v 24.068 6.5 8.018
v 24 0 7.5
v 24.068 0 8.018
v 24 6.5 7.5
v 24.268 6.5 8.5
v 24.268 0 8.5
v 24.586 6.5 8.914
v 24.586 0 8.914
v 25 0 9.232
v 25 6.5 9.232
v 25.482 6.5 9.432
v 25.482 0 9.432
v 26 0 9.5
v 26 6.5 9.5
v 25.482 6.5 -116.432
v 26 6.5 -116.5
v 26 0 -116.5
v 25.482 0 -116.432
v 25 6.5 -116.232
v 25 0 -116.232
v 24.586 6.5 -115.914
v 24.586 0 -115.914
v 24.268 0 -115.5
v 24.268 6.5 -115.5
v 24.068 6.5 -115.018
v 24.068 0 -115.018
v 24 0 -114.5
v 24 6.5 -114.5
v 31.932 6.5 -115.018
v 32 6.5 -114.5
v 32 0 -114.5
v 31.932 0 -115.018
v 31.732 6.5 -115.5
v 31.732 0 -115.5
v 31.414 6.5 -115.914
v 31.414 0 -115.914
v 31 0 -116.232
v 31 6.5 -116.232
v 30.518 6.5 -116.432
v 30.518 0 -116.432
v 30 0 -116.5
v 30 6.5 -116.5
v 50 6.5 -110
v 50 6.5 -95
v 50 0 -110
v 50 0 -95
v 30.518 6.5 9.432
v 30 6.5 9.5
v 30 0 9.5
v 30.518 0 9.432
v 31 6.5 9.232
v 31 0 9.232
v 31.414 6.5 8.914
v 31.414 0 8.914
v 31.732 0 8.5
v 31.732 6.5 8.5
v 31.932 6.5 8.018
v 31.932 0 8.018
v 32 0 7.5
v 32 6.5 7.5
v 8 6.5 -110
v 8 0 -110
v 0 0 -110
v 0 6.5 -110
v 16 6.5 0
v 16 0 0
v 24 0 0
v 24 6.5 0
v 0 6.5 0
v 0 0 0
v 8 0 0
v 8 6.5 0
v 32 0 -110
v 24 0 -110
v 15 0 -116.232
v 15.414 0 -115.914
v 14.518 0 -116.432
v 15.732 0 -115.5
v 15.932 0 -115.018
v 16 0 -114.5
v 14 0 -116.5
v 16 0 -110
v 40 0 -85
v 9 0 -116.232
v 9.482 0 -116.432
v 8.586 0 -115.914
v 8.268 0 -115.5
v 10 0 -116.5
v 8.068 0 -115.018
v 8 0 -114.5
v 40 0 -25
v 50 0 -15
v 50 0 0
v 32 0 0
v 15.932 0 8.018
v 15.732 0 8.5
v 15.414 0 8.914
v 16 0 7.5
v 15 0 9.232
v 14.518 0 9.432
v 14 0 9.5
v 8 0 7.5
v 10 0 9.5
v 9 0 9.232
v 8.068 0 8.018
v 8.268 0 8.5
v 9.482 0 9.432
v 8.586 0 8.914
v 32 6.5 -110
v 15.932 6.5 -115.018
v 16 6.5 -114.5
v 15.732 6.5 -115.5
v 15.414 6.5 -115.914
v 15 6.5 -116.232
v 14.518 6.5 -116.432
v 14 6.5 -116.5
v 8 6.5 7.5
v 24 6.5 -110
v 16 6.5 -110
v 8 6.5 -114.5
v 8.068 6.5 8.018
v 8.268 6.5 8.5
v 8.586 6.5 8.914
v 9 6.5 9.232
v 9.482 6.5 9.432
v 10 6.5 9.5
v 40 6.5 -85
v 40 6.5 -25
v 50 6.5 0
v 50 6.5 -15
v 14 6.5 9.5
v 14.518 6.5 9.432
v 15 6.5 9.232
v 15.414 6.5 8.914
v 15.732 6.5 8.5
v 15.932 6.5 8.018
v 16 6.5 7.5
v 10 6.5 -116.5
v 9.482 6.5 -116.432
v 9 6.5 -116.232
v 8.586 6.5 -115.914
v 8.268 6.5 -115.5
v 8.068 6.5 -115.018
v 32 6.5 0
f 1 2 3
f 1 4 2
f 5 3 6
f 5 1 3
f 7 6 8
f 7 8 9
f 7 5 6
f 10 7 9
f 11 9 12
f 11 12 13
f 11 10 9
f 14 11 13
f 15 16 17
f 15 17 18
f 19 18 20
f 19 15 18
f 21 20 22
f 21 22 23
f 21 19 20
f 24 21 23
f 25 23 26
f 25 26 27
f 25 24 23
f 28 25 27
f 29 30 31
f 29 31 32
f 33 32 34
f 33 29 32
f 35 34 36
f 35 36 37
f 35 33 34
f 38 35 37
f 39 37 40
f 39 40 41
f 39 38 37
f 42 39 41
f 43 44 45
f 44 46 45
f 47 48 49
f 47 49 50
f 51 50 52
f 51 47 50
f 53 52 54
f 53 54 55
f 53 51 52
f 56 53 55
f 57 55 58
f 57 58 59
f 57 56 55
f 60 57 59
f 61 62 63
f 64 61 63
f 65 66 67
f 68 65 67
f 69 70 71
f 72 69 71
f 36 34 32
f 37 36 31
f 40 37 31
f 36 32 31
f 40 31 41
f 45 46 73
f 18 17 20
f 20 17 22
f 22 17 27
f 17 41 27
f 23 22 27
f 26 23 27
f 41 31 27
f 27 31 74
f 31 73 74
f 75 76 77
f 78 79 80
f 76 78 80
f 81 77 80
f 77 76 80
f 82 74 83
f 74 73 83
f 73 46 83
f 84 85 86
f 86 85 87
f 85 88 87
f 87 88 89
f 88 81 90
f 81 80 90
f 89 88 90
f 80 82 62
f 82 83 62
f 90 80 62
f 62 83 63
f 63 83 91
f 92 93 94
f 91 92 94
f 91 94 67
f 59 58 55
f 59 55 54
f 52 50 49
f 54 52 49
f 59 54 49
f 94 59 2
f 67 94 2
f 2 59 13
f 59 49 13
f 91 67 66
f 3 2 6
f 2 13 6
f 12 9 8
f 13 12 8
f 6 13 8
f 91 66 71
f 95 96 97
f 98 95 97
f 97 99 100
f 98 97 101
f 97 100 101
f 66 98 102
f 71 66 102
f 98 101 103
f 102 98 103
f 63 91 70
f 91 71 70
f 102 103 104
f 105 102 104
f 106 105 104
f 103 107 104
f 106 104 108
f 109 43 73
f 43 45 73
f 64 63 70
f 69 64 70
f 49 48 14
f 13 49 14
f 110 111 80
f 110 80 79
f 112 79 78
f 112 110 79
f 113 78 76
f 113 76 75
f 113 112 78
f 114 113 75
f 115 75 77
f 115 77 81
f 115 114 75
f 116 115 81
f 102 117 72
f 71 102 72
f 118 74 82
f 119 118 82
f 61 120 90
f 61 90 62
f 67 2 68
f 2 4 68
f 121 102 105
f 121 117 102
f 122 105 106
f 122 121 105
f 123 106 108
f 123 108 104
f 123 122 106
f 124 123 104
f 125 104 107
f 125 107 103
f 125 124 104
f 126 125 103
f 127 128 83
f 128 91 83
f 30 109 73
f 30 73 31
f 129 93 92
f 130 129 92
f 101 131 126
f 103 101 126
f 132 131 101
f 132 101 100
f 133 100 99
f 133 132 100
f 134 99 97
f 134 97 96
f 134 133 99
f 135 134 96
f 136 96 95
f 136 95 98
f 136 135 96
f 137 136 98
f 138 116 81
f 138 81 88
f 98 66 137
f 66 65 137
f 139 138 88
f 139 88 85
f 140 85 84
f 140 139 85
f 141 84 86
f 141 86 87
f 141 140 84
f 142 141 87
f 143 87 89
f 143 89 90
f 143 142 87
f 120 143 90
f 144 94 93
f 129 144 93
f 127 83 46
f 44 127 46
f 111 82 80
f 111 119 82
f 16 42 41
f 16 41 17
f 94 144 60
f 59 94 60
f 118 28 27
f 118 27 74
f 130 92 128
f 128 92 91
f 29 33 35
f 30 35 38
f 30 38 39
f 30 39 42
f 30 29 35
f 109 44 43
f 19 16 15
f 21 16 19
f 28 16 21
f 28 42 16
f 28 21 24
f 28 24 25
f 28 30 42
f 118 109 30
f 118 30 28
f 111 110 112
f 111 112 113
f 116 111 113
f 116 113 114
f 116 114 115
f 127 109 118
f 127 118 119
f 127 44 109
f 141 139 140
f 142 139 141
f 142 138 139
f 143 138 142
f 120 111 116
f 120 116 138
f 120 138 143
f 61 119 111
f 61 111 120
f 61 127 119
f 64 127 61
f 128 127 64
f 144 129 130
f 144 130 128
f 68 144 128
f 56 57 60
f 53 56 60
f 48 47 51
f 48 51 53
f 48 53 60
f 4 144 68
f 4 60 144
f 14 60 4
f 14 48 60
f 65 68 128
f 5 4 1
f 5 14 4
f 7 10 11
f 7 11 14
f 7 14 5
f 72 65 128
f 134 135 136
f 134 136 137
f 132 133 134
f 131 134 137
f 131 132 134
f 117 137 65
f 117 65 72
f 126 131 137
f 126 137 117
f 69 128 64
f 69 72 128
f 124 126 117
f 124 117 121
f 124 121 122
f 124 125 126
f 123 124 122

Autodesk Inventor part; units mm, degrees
ref_plane "YZ Plane" through (0, 0, 0) normal (1, 0, 0) x (0, 1, 0)
ref_plane "XZ Plane" through (0, 0, 0) normal (0, 1, 0) x (-1, 0, 0)
ref_plane "XY Plane" through (0, 0, 0) normal (0, 0, 1) x (1, 0, 0)
sketch "Sketch1" plane through (0, 0, 0) normal (0, 1, 0) x (-1, 0, 0)
  line L0 (0, 0) -> (-40, 0)
  line L1 (-40, 0) -> (-40, -110)
  line L2 (-40, -110) -> (0, -110)
  line L3 (0, -110) -> (0, 0)
  dimension "d0" = 110
  dimension "d1" = 40
extrude "Extrusion1" add sketch "Sketch1" along normal blind 6.5
sketch "Sketch2" plane through (0, 6.5, 0) normal (0, 1, 0) x (1, 0, 0)
  line L0 (40, 0) -> (40, 110) projected
  line L1 (40, 110) -> (0, 110) projected
  line L2 (0, 110) -> (0, 0) projected
  line L3 (8, 110) -> (16, 110)
  line L4 (16, 110) -> (16, 114.5)
  line L5 (14, 116.5) -> (10, 116.5)
  line L6 (8, 114.5) -> (8, 110)
  line L7 (24, 110) -> (32, 110)
  line L8 (32, 110) -> (32, 114.5)
  line L9 (30, 116.5) -> (26, 116.5)
  line L10 (24, 114.5) -> (24, 110)
  arc A0 (10, 116.5) -> (8, 114.5) centre (10, 114.5) ccw
  arc A1 (16, 114.5) -> (14, 116.5) centre (14, 114.5) ccw
  arc A2 (26, 116.5) -> (24, 114.5) centre (26, 114.5) ccw
  arc A3 (32, 114.5) -> (30, 116.5) centre (30, 114.5) ccw
  line L11 (8, 112.25) -> (0, 112.25) construction
  line L12 (16, 112.25) -> (24, 112.25) construction
  line L13 (32, 112.25) -> (40, 112.25) construction
  line L14 (0, 55) -> (40, 55) construction
  line L15 (0, 0) -> (40, 0) projected
  line L16 (40, 0) -> (40, 110) projected
  line L17 (40, 110) -> (0, 110) projected
  line L18 (0, 110) -> (0, 0) projected
  line L19 (8, 0) -> (16, 0)
  line L20 (16, 0) -> (16, -7.5)
  line L21 (14, -9.5) -> (10, -9.5)
  line L22 (8, -7.5) -> (8, 0)
  line L23 (24, 0) -> (32, 0)
  line L24 (32, 0) -> (32, -7.5)
  line L25 (30, -9.5) -> (26, -9.5)
  line L26 (24, -7.5) -> (24, 0)
  arc A4 (8, -7.5) -> (10, -9.5) centre (10, -7.5) ccw
  arc A5 (14, -9.5) -> (16, -7.5) centre (14, -7.5) ccw
  arc A6 (24, -7.5) -> (26, -9.5) centre (26, -7.5) ccw
  arc A7 (30, -9.5) -> (32, -7.5) centre (30, -7.5) ccw
  dimension "d4" = 2
  dimension "d5" = 8
  dimension "d6" = 8
  dimension "d7" = 6.5
  dimension "d10" = 2
  dimension "d11" = 9.5
extrude "Extrusion3" add sketch "Sketch2" against normal blind 6.5 contours L24 A7 L25 A6 L26 L15 | L1 L10 A2 L9 A3 L8 | L20 A5 L21 A4 L22 L15 | L1 L6 A0 L5 A1 L4
sketch "Sketch3" plane through (0, 0, 0) normal (0, -1, 0) x (1, 0, 0)
  line L0 (0, -110) -> (0, 0) projected
  line L1 (40, 0) -> (40, -110) projected
  line L2 (8, 7.5) -> (8, 0) projected
  line L3 (40, 0) -> (50, 0)
  line L4 (50, 0) -> (50, -15)
  line L5 (50, -15) -> (40, -25)
  line L6 (40, -85) -> (50, -95)
  line L7 (50, -95) -> (50, -110)
  line L8 (50, -110) -> (40, -110)
  line L9 (40, -85) -> (40, -110)
  line L10 (40, 0) -> (40, -25)
  dimension "d14" = 10
  dimension "d15" = 15
  dimension "d16" = 45
  dimension "d17" = 15
extrude "Extrusion4" add sketch "Sketch3" against normal blind 6.5
equation "\"d6\" = d5"
equation "\"d17\" = d15"
properties part number "spool_stand_brace_middle_a" material "Plywood, Finish"
